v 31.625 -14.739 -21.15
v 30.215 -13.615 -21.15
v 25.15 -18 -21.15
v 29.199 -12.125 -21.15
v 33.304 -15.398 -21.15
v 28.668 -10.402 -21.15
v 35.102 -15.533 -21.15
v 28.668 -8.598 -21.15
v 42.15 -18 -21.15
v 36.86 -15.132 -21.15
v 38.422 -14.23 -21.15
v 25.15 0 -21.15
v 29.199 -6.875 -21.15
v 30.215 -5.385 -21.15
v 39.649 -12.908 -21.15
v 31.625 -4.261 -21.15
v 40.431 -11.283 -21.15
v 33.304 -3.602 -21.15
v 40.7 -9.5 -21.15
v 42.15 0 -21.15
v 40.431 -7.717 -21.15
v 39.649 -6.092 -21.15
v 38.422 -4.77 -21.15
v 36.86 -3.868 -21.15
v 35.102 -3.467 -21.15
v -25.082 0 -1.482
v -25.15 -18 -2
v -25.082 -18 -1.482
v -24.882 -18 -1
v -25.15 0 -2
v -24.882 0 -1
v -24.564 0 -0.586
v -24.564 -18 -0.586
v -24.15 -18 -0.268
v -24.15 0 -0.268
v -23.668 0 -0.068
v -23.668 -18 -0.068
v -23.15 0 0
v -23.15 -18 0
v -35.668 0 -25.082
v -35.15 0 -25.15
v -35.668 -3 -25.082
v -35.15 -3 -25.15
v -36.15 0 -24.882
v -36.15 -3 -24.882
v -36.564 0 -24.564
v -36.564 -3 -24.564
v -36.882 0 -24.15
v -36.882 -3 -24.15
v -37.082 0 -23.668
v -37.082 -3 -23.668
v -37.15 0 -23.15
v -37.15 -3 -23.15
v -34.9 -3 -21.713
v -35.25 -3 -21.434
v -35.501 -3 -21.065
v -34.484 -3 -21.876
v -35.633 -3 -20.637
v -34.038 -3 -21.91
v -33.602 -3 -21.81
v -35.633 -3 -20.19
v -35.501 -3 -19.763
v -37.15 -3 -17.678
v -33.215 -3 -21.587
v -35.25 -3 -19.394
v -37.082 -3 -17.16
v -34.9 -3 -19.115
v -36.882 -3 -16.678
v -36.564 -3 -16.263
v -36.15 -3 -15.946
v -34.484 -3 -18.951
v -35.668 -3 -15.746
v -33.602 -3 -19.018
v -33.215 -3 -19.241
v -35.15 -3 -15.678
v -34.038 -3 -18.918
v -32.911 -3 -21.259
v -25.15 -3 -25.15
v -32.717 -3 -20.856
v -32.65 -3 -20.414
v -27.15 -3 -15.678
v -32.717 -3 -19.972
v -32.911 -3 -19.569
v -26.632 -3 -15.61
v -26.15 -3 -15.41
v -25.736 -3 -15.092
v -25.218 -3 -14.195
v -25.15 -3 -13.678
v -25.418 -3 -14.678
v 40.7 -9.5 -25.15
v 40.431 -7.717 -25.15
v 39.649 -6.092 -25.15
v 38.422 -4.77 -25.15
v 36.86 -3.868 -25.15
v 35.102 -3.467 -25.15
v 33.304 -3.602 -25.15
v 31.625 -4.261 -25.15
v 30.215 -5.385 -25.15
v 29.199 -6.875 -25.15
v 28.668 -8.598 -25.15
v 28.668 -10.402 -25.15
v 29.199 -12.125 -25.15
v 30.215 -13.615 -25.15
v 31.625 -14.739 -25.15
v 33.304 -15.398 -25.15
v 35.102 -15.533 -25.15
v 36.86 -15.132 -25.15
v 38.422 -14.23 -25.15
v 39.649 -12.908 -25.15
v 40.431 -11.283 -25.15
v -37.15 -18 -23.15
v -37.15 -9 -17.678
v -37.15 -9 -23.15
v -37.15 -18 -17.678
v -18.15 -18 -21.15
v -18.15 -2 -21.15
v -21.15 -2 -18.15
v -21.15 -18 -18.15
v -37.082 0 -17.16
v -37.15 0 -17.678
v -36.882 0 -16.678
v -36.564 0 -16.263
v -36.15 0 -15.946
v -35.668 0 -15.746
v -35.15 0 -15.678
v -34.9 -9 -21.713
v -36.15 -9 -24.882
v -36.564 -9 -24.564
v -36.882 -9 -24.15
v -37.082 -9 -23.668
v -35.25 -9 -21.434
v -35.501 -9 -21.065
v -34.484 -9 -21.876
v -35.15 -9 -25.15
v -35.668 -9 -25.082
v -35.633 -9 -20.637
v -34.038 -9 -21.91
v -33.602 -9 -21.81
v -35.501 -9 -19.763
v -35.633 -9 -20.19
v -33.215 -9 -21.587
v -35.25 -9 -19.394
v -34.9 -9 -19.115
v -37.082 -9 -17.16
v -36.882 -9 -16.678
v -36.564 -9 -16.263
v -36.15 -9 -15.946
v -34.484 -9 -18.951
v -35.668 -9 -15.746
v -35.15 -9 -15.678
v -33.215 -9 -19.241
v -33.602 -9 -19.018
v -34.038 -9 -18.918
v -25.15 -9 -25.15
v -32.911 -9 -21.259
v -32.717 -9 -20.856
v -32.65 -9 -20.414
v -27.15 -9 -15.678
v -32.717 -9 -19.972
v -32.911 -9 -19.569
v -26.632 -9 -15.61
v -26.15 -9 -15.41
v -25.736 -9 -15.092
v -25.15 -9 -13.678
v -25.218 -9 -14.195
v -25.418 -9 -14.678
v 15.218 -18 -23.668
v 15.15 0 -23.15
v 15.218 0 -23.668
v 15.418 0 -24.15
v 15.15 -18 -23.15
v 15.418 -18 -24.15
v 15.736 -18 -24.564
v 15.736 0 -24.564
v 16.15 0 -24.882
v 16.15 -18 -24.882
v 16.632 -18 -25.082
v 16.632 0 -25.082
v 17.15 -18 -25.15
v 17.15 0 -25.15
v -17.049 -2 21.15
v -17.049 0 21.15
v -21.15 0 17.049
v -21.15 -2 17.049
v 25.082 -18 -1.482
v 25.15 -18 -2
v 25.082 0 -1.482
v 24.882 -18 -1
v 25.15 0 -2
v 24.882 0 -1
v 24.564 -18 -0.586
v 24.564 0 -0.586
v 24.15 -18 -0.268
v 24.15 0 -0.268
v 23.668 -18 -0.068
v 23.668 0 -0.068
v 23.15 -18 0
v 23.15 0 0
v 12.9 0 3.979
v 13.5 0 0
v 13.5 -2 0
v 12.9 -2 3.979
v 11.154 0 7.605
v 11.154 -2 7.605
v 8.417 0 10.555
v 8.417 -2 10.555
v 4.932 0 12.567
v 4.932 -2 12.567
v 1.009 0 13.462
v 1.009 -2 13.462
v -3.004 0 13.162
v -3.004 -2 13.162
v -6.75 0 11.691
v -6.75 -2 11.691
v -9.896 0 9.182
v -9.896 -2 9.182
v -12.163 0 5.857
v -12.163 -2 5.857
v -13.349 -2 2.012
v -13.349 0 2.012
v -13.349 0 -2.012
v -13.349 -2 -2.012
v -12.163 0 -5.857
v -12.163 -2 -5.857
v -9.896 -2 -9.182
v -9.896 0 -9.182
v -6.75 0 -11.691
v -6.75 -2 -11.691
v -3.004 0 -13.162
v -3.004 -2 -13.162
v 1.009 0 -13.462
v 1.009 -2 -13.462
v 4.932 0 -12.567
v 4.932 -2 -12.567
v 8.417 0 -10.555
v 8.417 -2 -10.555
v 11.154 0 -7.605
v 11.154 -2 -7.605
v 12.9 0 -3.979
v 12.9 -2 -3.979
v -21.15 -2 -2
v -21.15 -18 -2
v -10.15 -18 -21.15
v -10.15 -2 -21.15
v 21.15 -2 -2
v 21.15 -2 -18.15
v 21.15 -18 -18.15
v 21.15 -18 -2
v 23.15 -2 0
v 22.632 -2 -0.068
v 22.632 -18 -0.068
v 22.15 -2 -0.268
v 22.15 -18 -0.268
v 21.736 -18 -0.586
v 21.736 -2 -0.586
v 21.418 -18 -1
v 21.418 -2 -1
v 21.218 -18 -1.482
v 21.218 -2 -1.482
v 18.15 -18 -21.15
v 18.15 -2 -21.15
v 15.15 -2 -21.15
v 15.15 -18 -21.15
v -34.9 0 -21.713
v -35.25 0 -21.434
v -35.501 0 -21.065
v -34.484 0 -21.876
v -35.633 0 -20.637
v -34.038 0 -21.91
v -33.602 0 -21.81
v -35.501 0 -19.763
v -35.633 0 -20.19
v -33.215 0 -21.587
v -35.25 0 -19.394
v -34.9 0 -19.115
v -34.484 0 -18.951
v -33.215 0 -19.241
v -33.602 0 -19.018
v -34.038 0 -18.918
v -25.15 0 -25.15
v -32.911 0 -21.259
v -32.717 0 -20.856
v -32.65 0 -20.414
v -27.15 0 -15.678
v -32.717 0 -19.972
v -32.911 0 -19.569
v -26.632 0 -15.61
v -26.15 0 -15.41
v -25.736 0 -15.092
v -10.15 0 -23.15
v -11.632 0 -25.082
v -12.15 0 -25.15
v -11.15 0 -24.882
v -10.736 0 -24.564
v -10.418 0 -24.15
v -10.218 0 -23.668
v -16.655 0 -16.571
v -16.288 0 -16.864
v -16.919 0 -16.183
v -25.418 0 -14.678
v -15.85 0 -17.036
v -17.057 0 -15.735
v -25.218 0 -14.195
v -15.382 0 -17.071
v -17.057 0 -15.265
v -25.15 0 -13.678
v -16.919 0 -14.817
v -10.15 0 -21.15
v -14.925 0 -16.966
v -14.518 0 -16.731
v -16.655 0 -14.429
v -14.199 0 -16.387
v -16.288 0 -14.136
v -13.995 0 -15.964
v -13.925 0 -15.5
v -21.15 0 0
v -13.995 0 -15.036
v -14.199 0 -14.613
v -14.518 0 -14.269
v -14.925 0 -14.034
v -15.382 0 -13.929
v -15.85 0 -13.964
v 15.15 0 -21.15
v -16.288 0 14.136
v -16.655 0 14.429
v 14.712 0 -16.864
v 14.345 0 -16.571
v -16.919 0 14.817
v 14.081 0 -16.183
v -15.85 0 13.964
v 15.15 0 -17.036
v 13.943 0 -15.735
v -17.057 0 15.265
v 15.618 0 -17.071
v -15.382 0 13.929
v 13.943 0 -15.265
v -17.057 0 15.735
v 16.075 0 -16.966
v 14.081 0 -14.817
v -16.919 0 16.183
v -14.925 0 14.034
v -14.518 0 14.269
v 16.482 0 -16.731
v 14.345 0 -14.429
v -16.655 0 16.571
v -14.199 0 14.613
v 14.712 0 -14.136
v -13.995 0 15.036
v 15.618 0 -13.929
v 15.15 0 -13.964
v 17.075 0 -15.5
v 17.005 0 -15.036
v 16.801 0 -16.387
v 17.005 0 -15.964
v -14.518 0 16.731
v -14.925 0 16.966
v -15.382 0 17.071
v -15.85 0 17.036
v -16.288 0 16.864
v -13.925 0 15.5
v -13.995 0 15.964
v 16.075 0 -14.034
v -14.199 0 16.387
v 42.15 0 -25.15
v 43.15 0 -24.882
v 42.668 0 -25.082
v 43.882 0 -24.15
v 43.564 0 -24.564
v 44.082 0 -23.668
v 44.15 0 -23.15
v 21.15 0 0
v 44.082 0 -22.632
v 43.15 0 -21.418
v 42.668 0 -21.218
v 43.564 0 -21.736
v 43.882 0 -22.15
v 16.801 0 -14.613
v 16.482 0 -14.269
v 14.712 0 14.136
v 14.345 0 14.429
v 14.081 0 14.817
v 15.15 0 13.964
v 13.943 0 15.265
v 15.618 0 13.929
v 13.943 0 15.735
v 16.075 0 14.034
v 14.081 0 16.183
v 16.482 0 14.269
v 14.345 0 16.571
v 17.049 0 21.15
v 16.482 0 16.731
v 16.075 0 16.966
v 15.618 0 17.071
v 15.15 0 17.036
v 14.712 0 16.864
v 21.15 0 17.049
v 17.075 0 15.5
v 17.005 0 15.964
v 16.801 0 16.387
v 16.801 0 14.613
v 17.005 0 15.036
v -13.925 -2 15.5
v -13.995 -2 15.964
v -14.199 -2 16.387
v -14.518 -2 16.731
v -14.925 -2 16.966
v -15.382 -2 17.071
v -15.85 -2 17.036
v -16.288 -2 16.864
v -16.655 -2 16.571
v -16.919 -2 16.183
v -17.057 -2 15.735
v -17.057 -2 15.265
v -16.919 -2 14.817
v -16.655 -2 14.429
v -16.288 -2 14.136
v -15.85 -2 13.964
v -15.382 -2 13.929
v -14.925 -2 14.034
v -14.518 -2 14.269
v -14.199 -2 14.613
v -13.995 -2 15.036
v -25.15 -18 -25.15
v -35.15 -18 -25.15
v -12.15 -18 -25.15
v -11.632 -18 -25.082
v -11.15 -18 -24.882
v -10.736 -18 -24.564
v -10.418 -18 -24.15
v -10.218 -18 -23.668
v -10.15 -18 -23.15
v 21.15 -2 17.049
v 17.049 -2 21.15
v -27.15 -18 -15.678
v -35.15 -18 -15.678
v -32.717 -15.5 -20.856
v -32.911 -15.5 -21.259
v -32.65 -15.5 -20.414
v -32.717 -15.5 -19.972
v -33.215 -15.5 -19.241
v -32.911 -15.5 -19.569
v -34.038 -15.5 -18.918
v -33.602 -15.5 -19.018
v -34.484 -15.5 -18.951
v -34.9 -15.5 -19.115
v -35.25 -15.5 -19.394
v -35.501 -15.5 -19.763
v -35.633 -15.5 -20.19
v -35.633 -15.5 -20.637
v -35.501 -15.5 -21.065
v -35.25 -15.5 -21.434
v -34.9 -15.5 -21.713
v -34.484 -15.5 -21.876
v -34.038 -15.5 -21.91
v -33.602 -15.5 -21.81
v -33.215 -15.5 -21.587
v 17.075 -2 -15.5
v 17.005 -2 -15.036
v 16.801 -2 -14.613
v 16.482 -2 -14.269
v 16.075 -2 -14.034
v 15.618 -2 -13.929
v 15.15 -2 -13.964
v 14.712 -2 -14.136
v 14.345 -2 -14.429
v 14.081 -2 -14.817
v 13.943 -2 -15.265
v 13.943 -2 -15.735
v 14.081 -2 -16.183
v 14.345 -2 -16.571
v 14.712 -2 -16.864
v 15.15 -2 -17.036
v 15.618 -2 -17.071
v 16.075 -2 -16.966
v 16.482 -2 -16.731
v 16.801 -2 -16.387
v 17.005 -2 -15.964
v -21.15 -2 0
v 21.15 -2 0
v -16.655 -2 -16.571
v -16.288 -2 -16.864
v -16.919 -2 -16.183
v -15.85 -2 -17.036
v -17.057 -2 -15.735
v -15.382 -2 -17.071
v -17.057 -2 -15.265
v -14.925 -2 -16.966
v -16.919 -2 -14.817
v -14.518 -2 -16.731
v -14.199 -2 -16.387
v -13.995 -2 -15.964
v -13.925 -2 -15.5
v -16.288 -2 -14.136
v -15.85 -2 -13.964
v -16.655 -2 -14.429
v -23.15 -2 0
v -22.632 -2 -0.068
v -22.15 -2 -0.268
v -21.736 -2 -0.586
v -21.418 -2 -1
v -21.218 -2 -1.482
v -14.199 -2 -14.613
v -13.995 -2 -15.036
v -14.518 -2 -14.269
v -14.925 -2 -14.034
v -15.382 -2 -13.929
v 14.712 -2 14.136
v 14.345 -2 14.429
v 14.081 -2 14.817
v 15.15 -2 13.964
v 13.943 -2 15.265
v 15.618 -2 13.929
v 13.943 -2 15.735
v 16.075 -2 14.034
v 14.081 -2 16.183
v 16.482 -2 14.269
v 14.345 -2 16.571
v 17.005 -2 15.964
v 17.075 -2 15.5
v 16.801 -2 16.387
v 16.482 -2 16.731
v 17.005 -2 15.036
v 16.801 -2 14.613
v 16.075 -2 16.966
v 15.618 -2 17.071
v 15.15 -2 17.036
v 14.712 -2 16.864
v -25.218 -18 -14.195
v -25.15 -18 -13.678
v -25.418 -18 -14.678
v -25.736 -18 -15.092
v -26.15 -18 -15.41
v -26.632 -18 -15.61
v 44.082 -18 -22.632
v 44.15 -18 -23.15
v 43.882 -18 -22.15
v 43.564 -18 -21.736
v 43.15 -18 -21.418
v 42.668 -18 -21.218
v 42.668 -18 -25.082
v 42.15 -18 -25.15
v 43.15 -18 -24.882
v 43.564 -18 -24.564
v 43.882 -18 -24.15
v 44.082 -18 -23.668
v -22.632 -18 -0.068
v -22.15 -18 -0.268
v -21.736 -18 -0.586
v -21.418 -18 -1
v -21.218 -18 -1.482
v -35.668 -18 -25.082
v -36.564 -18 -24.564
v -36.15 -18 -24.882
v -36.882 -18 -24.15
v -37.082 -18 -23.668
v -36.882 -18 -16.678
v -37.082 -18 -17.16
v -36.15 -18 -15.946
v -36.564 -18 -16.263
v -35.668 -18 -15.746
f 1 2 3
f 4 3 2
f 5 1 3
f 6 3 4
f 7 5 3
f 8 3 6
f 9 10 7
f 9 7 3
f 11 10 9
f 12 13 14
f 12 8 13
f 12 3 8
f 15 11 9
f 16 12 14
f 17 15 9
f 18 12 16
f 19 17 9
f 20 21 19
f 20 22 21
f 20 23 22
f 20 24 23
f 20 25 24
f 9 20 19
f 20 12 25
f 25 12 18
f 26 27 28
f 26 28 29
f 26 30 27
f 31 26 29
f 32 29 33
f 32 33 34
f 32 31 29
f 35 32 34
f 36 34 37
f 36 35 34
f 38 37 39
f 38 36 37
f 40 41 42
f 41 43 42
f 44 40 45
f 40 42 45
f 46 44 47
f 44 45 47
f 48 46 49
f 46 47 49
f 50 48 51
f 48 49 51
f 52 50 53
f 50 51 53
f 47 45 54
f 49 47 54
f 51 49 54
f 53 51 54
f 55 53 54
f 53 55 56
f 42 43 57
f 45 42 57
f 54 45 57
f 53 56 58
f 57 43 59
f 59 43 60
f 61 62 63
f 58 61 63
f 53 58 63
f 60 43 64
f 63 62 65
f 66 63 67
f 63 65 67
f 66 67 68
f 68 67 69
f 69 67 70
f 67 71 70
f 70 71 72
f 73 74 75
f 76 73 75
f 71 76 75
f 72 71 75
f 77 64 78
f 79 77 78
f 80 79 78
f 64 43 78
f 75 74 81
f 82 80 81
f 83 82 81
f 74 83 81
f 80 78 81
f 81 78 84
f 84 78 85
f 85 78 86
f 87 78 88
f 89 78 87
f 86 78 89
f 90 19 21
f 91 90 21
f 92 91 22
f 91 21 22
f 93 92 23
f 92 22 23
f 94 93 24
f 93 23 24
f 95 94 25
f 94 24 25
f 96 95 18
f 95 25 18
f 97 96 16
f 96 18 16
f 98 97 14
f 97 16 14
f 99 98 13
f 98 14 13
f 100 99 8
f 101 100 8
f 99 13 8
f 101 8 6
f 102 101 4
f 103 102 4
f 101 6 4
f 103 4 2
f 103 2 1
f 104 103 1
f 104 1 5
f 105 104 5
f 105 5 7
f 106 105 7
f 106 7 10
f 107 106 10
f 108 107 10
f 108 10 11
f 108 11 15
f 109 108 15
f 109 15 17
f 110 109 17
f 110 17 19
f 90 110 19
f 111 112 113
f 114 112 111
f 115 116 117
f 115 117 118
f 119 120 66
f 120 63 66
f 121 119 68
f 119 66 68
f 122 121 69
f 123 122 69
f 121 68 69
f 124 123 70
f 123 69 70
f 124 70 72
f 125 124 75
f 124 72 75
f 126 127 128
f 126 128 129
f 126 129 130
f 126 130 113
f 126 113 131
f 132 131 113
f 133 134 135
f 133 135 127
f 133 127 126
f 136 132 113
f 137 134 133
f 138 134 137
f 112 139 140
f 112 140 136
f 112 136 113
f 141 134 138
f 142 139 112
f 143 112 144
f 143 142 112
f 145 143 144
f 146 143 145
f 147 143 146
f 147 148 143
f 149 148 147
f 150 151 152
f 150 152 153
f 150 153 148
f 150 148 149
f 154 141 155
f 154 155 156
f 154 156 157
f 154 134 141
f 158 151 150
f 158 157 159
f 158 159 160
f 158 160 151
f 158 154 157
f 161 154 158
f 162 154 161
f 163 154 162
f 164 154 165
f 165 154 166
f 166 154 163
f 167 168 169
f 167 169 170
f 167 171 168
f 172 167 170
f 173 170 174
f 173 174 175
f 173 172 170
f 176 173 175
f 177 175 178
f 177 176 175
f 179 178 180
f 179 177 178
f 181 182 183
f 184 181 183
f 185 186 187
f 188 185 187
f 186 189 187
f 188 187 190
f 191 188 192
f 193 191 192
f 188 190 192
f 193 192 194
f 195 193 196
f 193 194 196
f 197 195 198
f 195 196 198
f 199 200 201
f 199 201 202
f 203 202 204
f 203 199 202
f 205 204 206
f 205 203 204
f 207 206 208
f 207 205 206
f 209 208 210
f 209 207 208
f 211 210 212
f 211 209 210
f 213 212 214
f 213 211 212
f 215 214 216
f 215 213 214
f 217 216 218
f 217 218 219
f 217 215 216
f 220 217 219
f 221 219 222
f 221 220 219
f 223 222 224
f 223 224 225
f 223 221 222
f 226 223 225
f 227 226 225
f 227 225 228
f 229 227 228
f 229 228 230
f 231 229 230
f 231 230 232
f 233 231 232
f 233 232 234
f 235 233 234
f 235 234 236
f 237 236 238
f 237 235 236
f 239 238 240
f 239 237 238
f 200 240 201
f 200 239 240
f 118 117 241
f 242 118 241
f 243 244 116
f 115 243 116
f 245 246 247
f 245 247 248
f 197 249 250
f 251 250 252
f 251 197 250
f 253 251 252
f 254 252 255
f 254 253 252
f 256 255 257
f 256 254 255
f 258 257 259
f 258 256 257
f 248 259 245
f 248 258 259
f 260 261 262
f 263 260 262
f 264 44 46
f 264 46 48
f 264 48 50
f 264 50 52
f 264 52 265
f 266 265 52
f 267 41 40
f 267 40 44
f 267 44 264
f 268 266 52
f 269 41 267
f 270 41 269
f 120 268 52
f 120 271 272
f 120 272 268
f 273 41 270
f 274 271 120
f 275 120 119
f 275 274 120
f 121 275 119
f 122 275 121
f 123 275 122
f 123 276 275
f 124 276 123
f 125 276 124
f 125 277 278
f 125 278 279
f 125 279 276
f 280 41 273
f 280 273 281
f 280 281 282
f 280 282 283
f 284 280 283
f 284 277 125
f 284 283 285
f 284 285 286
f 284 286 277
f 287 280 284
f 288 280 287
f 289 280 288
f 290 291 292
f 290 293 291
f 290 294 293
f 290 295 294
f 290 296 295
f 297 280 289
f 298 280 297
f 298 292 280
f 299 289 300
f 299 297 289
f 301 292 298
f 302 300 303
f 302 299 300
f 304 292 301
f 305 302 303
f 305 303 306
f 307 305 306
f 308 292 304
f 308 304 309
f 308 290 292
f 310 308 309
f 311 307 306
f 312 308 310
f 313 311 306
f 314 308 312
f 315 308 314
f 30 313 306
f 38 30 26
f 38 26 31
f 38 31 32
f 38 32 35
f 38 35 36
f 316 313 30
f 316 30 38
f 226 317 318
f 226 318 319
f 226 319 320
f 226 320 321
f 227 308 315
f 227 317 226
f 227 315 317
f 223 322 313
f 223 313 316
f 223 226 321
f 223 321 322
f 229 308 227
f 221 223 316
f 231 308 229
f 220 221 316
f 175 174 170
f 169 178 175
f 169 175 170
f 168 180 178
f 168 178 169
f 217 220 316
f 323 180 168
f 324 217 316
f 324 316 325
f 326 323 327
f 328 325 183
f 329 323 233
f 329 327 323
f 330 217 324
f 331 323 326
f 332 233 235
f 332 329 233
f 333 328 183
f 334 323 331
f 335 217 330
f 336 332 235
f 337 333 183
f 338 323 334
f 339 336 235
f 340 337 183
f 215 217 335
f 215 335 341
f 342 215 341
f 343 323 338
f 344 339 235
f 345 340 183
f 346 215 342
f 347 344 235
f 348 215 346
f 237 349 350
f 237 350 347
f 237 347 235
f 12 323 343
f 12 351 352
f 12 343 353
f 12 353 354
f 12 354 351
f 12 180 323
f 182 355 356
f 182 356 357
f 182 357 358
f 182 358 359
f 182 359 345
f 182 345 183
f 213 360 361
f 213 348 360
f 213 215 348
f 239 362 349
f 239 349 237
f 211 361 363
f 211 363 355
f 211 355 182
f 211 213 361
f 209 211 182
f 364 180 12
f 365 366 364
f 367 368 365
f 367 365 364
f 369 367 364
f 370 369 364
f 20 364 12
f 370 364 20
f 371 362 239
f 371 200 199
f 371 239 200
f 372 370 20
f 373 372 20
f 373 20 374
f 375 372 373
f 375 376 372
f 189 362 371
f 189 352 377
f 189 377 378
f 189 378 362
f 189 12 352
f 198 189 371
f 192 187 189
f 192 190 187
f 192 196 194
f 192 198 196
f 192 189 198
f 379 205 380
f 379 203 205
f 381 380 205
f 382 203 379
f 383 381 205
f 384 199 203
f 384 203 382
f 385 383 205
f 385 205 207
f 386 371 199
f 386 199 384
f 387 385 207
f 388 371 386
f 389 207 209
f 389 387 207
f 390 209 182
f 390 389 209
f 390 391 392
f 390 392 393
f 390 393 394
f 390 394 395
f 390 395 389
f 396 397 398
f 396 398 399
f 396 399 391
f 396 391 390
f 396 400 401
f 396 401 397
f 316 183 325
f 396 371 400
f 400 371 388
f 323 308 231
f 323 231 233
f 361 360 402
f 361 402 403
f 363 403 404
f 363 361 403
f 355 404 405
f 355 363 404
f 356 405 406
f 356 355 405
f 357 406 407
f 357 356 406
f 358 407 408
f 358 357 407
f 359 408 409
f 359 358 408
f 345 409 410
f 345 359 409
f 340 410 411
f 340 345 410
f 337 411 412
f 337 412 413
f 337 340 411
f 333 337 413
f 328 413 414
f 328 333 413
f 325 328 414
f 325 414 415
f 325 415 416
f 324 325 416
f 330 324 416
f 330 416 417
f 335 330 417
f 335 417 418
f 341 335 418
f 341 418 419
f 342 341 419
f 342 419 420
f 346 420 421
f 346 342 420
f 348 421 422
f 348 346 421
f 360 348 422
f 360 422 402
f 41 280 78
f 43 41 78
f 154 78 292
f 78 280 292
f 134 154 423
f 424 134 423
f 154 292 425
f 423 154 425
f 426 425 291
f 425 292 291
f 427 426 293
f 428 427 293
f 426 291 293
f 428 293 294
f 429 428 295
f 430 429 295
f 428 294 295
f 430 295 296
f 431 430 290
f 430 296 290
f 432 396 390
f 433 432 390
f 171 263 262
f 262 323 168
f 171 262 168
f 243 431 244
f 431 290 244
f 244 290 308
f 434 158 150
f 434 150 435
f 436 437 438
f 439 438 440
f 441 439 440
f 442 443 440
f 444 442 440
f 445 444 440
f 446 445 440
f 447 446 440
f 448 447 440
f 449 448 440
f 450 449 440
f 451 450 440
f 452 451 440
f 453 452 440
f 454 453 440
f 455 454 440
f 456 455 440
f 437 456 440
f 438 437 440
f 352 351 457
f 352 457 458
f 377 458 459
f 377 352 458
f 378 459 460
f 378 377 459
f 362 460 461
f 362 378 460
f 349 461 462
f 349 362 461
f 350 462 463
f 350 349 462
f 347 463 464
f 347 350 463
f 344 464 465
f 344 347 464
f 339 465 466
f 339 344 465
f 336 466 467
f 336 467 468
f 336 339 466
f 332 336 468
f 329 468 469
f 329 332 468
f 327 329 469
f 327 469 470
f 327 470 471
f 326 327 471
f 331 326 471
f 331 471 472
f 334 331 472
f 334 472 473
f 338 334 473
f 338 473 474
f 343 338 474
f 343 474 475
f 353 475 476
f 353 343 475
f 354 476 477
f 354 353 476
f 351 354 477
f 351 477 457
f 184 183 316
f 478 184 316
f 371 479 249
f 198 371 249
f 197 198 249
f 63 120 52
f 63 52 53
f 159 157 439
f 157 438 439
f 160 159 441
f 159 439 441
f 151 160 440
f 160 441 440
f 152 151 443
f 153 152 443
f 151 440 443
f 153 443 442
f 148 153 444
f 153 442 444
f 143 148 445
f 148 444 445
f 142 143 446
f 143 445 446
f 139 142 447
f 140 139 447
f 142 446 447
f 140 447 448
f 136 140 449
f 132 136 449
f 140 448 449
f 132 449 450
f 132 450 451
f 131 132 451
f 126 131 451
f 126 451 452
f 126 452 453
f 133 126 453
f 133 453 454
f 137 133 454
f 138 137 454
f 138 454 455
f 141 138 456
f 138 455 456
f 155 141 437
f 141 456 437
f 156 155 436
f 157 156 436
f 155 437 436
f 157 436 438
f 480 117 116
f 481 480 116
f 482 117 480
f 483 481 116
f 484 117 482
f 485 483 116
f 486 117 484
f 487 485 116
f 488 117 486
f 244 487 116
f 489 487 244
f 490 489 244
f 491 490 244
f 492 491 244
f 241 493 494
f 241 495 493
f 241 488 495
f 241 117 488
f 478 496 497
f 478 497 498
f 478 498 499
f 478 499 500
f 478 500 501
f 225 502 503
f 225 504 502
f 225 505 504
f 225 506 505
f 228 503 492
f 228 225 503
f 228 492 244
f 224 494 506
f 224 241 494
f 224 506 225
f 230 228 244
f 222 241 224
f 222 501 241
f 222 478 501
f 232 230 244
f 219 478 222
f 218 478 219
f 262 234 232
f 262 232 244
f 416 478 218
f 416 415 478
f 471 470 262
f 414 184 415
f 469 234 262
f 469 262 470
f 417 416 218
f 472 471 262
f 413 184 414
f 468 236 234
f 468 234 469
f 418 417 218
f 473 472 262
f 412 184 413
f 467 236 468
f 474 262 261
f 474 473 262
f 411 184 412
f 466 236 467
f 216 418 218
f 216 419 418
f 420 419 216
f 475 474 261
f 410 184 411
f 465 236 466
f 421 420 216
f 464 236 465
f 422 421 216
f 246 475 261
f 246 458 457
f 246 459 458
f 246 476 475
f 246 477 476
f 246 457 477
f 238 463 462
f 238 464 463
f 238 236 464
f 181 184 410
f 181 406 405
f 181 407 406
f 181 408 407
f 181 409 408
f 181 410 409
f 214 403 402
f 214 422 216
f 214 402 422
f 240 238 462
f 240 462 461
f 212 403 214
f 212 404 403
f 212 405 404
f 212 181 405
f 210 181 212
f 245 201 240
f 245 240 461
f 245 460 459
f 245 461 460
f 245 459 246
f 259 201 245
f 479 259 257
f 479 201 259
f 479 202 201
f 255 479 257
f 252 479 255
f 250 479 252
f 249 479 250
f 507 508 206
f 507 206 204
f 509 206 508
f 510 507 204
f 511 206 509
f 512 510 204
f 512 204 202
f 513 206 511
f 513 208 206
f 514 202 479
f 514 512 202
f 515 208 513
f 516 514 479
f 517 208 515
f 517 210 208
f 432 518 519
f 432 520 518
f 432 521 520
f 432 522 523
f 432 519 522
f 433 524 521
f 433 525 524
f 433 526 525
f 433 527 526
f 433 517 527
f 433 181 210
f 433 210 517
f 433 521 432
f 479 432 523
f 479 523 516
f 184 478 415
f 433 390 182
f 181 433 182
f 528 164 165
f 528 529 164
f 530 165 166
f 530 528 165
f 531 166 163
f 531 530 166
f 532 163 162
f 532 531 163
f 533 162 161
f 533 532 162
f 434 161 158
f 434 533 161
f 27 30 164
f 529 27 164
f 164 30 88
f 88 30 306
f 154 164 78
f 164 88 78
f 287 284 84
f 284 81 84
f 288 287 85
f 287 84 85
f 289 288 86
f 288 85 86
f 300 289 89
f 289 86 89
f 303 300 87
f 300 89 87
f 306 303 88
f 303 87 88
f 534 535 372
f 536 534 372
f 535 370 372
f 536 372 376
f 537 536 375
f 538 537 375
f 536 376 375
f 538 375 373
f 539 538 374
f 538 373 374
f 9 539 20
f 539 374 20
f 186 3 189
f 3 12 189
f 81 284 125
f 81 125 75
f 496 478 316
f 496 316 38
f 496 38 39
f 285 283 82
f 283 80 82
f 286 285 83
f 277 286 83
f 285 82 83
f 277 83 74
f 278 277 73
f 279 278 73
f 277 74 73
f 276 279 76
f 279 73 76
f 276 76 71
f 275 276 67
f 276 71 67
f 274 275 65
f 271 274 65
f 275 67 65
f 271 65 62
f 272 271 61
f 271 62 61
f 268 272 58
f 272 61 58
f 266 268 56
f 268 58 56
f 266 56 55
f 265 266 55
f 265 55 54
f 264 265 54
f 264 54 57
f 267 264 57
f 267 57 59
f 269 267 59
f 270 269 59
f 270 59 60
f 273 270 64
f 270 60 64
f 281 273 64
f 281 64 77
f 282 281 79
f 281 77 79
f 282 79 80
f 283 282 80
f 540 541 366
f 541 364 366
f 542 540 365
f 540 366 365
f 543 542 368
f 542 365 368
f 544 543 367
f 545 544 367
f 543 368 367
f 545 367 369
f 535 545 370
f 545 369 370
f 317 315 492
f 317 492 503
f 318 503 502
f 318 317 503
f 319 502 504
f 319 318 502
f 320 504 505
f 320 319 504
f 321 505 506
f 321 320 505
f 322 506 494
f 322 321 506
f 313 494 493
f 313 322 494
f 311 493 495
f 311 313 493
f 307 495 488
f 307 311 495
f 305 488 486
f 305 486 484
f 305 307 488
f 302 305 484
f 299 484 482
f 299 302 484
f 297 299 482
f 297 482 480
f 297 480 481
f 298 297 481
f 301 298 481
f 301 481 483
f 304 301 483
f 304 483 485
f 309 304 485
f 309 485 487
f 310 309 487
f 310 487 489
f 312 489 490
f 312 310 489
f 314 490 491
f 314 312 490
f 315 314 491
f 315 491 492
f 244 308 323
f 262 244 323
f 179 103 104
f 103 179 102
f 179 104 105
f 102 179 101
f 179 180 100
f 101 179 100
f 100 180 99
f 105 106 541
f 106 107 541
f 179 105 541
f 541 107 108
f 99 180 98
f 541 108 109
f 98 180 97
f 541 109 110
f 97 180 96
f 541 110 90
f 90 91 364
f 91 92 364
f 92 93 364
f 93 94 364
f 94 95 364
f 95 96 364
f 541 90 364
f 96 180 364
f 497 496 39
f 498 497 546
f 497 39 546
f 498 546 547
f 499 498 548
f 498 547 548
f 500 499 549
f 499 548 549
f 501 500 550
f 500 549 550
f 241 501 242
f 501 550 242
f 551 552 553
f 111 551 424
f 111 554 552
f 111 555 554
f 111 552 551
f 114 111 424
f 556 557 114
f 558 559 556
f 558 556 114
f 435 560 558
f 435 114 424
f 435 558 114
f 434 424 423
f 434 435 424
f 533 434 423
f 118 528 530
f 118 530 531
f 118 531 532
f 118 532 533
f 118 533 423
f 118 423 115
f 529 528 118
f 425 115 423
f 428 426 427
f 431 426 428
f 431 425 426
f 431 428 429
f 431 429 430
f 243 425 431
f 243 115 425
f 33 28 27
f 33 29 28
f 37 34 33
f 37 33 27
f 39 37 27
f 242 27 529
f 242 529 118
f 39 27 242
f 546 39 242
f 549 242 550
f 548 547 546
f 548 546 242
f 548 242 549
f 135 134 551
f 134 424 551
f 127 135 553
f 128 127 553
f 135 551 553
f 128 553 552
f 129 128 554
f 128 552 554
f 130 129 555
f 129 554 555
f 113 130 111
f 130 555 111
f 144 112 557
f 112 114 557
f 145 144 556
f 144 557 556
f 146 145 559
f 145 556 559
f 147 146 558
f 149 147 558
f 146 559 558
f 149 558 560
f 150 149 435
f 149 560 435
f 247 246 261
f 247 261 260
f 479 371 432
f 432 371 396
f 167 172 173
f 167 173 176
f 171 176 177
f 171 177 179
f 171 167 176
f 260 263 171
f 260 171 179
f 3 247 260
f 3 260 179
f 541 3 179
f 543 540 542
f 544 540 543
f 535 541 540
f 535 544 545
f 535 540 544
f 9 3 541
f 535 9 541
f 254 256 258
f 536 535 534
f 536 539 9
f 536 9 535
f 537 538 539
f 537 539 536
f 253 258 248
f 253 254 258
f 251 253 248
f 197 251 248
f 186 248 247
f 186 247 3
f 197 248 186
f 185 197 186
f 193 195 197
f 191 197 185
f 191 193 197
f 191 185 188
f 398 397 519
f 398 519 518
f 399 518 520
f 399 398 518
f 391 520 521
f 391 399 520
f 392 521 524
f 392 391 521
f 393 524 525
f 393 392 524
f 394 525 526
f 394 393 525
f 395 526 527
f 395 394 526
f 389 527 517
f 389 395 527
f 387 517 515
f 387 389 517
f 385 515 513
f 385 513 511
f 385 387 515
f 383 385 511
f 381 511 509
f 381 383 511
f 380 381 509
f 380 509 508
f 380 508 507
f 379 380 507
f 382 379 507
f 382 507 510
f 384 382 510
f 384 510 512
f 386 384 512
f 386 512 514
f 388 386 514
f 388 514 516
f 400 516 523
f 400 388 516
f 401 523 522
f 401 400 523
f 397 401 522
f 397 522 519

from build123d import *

# Parameters (mm, degrees)
F0_R     = 1.575
F0_R_2   = 13.5
F0_W     = 4
F0_H     = 21.15
F0_W_2   = 19
F0_H_2   = 4
F1_DEPTH = 2
F2_DEPTH = 18
F4_W     = 3
F4_H     = 9.4722927755
F4_W_2   = 9
F5_DEPTH = 12
F6_R     = 1.5
F7_DEPTH = 12.5
F3_R     = 6.05
F8_DEPTH = 25
F9_R     = 1.99999
F10_SIZE = 3


# Not quite as in the source:
# - a fillet or chamfer is up to 0.001 mm smaller than in the source, because OpenCascade refuses the exact size


with BuildPart() as f1:
    # F0 (on Front) → F1 (new body)
    with BuildSketch(Plane.XZ):
        Polygon((21.15, 17.0487806691), (17.0487806691, 21.15), (-17.0487806691, 21.15), (-21.15, 17.0487806691), (-21.15, 0), (-21.15, -21.15), (-10.15, -21.15), (15.15, -21.15), (21.15, -21.15), (21.15, 0), align=None)
        with Locations((-15.5, -15.5)):
            Circle(F0_R, mode=Mode.SUBTRACT)
        with Locations((15.5, -15.5)):
            Circle(F0_R, mode=Mode.SUBTRACT)
        Circle(F0_R_2, mode=Mode.SUBTRACT)
        with Locations((-15.5, 15.5)):
            Circle(F0_R, mode=Mode.SUBTRACT)
        with Locations((15.5, 15.5)):
            Circle(F0_R, mode=Mode.SUBTRACT)
        Polygon((-21.15, -21.15), (-21.15, 0), (-25.15, 0), (-25.15, -25.15), (-10.15, -25.15), (-10.15, -21.15), align=None)
        Polygon((25.15, -21.15), (21.15, -21.15), (15.15, -21.15), (15.15, -25.15), (25.15, -25.15), align=None)
        with Locations((23.15, -10.575)):
            Rectangle(F0_W, F0_H)
        with Locations((34.65, -23.15)):
            Rectangle(F0_W_2, F0_H_2)
    extrude(amount=F1_DEPTH)

    # F0 (on Front) → F2 (join)
    with BuildSketch(Plane.XZ):
        Polygon((-21.15, -21.15), (-21.15, 0), (-25.15, 0), (-25.15, -25.15), (-10.15, -25.15), (-10.15, -21.15), align=None)
        Polygon((25.15, -21.15), (21.15, -21.15), (15.15, -21.15), (15.15, -25.15), (25.15, -25.15), align=None)
        with Locations((34.65, -23.15)):
            Rectangle(F0_W_2, F0_H_2)
        with Locations((23.15, -10.575)):
            Rectangle(F0_W, F0_H)
    extrude(amount=F2_DEPTH)

    # F4 (on face) → F5 (join)
    with BuildSketch(Plane(origin=(-25.15, 0, 0), x_dir=(0, -1, 0), z_dir=(-1, 0, 0))):
        with Locations((1.5, -20.4138536122)):
            Rectangle(F4_W, F4_H)
        with Locations((13.5, -20.4138536122)):
            Rectangle(F4_W_2, F4_H)
    extrude(amount=F5_DEPTH)

    # F6 (on face) → F7 (cut, symmetric)
    with BuildSketch(Plane.XZ.offset(3)):
        with Locations((-34.15, -20.4138536122)):
            Circle(F6_R)
    extrude(amount=F7_DEPTH, both=True, mode=Mode.SUBTRACT)

    # F3 (on face) → F8 (cut)
    with BuildSketch(Plane.XY.offset(-21.15)):
        with Locations((34.65, -9.5)):
            Circle(F3_R)
    extrude(amount=-F8_DEPTH, mode=Mode.SUBTRACT)

    # F9 (radius 2 in the source; OpenCascade refuses exactly that, so slightly less here)
    f9_edges = [f1.edges().sort_by_distance(p)[0] for p in [
        (-25.15, -1.5, -15.677707),
        (-37.15, -1.5, -15.677707),
        (-37.15, -1.5, -25.15),
        (-37.15, -13.5, -15.677707),
        (-37.15, -13.5, -25.15),
        (-25.15, -13.5, -15.677707),
        (-10.15, -9, -25.15),
        (15.15, -9, -25.15),
        (44.15, -9, -25.15),
        (44.15, -9, -21.15),
        (25.15, -9, 0),
        (21.15, -10, 0),
        (-21.15, -10, 0),
        (-25.15, -9, 0),
    ]]
    fillet(f9_edges, radius=F9_R)

    # F10
    f10_edges = [f1.edges().sort_by_distance(p)[0] for p in [
        (21.15, -10, -21.15),
        (-21.15, -10, -21.15),
    ]]
    chamfer(f10_edges, length=F10_SIZE)


solid = f1.part
